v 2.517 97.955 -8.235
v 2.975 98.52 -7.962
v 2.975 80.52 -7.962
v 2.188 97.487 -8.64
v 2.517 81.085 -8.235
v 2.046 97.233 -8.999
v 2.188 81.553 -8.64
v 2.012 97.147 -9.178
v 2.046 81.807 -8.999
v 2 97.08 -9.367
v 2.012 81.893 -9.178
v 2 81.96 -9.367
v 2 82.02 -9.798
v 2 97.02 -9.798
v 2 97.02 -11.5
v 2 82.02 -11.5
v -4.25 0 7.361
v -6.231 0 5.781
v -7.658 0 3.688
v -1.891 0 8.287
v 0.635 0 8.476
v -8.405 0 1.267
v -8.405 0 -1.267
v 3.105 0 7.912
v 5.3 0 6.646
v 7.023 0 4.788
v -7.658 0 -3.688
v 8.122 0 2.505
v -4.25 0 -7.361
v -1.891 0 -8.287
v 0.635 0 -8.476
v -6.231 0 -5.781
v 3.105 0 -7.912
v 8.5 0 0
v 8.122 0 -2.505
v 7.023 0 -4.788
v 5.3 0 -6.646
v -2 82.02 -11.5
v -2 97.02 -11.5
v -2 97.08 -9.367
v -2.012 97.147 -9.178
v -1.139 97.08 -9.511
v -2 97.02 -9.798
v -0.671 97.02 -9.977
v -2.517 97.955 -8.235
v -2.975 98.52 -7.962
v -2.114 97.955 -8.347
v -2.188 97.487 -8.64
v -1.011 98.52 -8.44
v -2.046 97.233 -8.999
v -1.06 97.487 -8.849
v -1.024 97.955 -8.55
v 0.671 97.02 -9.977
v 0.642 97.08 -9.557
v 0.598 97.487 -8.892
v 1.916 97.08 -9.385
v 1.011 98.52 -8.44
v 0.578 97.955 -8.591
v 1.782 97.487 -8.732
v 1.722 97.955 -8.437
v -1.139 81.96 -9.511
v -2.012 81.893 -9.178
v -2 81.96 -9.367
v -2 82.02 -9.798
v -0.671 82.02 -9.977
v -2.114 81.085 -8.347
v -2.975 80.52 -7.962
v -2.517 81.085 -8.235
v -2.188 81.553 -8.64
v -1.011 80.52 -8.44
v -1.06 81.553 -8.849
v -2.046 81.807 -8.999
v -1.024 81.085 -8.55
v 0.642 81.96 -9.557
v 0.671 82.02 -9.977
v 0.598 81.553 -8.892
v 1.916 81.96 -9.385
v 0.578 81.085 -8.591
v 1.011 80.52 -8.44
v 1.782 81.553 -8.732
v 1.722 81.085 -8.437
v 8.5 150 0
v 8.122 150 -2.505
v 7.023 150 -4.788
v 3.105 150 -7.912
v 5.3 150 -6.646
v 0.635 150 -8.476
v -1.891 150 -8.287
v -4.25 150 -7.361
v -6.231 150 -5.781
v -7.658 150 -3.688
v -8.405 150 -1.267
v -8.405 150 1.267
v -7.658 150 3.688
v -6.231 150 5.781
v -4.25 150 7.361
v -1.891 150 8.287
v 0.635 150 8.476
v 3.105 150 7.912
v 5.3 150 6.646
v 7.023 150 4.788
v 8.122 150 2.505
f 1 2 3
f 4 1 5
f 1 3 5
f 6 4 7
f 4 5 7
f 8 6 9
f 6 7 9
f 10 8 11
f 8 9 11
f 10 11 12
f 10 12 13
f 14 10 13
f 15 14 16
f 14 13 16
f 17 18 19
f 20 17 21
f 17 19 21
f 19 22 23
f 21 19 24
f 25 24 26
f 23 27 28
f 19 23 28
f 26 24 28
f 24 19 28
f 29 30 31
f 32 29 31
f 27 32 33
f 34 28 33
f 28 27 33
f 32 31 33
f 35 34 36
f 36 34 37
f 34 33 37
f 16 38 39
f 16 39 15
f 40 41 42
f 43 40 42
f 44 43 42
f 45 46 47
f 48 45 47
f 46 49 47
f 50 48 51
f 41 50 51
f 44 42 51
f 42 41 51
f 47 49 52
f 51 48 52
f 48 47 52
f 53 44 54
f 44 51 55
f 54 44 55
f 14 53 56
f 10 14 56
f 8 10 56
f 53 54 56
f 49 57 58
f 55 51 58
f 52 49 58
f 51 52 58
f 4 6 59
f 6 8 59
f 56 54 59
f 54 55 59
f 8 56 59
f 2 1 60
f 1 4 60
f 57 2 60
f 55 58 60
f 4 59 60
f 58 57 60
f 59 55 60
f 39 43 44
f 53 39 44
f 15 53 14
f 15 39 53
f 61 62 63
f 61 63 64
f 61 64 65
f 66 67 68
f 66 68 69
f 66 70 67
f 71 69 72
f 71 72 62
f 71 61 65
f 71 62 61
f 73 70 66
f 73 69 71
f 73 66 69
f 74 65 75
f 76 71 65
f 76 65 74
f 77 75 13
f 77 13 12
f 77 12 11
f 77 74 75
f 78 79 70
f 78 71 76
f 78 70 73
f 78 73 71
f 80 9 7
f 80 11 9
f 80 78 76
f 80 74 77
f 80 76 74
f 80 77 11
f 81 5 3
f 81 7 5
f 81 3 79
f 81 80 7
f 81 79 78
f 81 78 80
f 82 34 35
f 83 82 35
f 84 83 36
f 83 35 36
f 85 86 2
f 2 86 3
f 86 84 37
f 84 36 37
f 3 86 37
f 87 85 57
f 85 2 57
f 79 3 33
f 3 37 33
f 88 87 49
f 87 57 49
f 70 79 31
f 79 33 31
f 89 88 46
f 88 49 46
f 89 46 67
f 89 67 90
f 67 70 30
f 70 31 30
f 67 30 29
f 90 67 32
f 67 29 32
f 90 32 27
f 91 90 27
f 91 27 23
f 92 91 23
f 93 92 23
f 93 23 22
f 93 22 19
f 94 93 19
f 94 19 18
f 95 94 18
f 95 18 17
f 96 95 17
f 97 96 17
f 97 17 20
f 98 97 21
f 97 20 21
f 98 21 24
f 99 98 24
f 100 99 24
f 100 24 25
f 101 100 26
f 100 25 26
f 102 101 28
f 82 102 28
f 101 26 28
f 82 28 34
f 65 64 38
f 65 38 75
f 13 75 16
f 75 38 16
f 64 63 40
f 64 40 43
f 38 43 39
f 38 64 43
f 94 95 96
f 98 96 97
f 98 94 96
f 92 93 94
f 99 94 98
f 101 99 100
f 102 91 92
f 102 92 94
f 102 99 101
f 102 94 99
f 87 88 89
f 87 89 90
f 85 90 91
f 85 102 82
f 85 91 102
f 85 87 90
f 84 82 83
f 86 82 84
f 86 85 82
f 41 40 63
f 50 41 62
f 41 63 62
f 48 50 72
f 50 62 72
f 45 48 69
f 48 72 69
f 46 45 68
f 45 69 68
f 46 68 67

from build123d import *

# Parameters (mm, degrees)
SKETCH1_R           = 8.5
BOSS_EXTRUDE1_DEPTH = 150
SKETCH5_W           = 4
SKETCH5_H           = 11.5
BOSS_EXTRUDE2_DEPTH = 15
FILLET1_R           = 1.5


with BuildPart() as part:
    # Sketch1 → Boss-Extrude1 (new body)
    with BuildSketch(Plane(origin=(0, 0, 0), x_dir=(1, 0, 0), z_dir=(0, 1, 0))):
        Circle(SKETCH1_R)
    extrude(amount=BOSS_EXTRUDE1_DEPTH)

    # Sketch5 → Boss-Extrude2 (add)
    with BuildSketch(Plane(origin=(0, 82.02, 0), x_dir=(1, 0, 0), z_dir=(0, 1, 0))):
        with Locations((0, 5.75)):
            Rectangle(SKETCH5_W, SKETCH5_H)
    extrude(amount=BOSS_EXTRUDE2_DEPTH)

    # Fillet1
    fillet1_edges = [part.edges().sort_by_distance(p)[0] for p in [
        (0, 82.02, -8.5),
        (-2, 89.52, -8.261355821),
        (2, 89.52, -8.261355821),
        (0, 97.02, -8.5),
    ]]
    fillet(fillet1_edges, radius=FILLET1_R)


solid = part.part
